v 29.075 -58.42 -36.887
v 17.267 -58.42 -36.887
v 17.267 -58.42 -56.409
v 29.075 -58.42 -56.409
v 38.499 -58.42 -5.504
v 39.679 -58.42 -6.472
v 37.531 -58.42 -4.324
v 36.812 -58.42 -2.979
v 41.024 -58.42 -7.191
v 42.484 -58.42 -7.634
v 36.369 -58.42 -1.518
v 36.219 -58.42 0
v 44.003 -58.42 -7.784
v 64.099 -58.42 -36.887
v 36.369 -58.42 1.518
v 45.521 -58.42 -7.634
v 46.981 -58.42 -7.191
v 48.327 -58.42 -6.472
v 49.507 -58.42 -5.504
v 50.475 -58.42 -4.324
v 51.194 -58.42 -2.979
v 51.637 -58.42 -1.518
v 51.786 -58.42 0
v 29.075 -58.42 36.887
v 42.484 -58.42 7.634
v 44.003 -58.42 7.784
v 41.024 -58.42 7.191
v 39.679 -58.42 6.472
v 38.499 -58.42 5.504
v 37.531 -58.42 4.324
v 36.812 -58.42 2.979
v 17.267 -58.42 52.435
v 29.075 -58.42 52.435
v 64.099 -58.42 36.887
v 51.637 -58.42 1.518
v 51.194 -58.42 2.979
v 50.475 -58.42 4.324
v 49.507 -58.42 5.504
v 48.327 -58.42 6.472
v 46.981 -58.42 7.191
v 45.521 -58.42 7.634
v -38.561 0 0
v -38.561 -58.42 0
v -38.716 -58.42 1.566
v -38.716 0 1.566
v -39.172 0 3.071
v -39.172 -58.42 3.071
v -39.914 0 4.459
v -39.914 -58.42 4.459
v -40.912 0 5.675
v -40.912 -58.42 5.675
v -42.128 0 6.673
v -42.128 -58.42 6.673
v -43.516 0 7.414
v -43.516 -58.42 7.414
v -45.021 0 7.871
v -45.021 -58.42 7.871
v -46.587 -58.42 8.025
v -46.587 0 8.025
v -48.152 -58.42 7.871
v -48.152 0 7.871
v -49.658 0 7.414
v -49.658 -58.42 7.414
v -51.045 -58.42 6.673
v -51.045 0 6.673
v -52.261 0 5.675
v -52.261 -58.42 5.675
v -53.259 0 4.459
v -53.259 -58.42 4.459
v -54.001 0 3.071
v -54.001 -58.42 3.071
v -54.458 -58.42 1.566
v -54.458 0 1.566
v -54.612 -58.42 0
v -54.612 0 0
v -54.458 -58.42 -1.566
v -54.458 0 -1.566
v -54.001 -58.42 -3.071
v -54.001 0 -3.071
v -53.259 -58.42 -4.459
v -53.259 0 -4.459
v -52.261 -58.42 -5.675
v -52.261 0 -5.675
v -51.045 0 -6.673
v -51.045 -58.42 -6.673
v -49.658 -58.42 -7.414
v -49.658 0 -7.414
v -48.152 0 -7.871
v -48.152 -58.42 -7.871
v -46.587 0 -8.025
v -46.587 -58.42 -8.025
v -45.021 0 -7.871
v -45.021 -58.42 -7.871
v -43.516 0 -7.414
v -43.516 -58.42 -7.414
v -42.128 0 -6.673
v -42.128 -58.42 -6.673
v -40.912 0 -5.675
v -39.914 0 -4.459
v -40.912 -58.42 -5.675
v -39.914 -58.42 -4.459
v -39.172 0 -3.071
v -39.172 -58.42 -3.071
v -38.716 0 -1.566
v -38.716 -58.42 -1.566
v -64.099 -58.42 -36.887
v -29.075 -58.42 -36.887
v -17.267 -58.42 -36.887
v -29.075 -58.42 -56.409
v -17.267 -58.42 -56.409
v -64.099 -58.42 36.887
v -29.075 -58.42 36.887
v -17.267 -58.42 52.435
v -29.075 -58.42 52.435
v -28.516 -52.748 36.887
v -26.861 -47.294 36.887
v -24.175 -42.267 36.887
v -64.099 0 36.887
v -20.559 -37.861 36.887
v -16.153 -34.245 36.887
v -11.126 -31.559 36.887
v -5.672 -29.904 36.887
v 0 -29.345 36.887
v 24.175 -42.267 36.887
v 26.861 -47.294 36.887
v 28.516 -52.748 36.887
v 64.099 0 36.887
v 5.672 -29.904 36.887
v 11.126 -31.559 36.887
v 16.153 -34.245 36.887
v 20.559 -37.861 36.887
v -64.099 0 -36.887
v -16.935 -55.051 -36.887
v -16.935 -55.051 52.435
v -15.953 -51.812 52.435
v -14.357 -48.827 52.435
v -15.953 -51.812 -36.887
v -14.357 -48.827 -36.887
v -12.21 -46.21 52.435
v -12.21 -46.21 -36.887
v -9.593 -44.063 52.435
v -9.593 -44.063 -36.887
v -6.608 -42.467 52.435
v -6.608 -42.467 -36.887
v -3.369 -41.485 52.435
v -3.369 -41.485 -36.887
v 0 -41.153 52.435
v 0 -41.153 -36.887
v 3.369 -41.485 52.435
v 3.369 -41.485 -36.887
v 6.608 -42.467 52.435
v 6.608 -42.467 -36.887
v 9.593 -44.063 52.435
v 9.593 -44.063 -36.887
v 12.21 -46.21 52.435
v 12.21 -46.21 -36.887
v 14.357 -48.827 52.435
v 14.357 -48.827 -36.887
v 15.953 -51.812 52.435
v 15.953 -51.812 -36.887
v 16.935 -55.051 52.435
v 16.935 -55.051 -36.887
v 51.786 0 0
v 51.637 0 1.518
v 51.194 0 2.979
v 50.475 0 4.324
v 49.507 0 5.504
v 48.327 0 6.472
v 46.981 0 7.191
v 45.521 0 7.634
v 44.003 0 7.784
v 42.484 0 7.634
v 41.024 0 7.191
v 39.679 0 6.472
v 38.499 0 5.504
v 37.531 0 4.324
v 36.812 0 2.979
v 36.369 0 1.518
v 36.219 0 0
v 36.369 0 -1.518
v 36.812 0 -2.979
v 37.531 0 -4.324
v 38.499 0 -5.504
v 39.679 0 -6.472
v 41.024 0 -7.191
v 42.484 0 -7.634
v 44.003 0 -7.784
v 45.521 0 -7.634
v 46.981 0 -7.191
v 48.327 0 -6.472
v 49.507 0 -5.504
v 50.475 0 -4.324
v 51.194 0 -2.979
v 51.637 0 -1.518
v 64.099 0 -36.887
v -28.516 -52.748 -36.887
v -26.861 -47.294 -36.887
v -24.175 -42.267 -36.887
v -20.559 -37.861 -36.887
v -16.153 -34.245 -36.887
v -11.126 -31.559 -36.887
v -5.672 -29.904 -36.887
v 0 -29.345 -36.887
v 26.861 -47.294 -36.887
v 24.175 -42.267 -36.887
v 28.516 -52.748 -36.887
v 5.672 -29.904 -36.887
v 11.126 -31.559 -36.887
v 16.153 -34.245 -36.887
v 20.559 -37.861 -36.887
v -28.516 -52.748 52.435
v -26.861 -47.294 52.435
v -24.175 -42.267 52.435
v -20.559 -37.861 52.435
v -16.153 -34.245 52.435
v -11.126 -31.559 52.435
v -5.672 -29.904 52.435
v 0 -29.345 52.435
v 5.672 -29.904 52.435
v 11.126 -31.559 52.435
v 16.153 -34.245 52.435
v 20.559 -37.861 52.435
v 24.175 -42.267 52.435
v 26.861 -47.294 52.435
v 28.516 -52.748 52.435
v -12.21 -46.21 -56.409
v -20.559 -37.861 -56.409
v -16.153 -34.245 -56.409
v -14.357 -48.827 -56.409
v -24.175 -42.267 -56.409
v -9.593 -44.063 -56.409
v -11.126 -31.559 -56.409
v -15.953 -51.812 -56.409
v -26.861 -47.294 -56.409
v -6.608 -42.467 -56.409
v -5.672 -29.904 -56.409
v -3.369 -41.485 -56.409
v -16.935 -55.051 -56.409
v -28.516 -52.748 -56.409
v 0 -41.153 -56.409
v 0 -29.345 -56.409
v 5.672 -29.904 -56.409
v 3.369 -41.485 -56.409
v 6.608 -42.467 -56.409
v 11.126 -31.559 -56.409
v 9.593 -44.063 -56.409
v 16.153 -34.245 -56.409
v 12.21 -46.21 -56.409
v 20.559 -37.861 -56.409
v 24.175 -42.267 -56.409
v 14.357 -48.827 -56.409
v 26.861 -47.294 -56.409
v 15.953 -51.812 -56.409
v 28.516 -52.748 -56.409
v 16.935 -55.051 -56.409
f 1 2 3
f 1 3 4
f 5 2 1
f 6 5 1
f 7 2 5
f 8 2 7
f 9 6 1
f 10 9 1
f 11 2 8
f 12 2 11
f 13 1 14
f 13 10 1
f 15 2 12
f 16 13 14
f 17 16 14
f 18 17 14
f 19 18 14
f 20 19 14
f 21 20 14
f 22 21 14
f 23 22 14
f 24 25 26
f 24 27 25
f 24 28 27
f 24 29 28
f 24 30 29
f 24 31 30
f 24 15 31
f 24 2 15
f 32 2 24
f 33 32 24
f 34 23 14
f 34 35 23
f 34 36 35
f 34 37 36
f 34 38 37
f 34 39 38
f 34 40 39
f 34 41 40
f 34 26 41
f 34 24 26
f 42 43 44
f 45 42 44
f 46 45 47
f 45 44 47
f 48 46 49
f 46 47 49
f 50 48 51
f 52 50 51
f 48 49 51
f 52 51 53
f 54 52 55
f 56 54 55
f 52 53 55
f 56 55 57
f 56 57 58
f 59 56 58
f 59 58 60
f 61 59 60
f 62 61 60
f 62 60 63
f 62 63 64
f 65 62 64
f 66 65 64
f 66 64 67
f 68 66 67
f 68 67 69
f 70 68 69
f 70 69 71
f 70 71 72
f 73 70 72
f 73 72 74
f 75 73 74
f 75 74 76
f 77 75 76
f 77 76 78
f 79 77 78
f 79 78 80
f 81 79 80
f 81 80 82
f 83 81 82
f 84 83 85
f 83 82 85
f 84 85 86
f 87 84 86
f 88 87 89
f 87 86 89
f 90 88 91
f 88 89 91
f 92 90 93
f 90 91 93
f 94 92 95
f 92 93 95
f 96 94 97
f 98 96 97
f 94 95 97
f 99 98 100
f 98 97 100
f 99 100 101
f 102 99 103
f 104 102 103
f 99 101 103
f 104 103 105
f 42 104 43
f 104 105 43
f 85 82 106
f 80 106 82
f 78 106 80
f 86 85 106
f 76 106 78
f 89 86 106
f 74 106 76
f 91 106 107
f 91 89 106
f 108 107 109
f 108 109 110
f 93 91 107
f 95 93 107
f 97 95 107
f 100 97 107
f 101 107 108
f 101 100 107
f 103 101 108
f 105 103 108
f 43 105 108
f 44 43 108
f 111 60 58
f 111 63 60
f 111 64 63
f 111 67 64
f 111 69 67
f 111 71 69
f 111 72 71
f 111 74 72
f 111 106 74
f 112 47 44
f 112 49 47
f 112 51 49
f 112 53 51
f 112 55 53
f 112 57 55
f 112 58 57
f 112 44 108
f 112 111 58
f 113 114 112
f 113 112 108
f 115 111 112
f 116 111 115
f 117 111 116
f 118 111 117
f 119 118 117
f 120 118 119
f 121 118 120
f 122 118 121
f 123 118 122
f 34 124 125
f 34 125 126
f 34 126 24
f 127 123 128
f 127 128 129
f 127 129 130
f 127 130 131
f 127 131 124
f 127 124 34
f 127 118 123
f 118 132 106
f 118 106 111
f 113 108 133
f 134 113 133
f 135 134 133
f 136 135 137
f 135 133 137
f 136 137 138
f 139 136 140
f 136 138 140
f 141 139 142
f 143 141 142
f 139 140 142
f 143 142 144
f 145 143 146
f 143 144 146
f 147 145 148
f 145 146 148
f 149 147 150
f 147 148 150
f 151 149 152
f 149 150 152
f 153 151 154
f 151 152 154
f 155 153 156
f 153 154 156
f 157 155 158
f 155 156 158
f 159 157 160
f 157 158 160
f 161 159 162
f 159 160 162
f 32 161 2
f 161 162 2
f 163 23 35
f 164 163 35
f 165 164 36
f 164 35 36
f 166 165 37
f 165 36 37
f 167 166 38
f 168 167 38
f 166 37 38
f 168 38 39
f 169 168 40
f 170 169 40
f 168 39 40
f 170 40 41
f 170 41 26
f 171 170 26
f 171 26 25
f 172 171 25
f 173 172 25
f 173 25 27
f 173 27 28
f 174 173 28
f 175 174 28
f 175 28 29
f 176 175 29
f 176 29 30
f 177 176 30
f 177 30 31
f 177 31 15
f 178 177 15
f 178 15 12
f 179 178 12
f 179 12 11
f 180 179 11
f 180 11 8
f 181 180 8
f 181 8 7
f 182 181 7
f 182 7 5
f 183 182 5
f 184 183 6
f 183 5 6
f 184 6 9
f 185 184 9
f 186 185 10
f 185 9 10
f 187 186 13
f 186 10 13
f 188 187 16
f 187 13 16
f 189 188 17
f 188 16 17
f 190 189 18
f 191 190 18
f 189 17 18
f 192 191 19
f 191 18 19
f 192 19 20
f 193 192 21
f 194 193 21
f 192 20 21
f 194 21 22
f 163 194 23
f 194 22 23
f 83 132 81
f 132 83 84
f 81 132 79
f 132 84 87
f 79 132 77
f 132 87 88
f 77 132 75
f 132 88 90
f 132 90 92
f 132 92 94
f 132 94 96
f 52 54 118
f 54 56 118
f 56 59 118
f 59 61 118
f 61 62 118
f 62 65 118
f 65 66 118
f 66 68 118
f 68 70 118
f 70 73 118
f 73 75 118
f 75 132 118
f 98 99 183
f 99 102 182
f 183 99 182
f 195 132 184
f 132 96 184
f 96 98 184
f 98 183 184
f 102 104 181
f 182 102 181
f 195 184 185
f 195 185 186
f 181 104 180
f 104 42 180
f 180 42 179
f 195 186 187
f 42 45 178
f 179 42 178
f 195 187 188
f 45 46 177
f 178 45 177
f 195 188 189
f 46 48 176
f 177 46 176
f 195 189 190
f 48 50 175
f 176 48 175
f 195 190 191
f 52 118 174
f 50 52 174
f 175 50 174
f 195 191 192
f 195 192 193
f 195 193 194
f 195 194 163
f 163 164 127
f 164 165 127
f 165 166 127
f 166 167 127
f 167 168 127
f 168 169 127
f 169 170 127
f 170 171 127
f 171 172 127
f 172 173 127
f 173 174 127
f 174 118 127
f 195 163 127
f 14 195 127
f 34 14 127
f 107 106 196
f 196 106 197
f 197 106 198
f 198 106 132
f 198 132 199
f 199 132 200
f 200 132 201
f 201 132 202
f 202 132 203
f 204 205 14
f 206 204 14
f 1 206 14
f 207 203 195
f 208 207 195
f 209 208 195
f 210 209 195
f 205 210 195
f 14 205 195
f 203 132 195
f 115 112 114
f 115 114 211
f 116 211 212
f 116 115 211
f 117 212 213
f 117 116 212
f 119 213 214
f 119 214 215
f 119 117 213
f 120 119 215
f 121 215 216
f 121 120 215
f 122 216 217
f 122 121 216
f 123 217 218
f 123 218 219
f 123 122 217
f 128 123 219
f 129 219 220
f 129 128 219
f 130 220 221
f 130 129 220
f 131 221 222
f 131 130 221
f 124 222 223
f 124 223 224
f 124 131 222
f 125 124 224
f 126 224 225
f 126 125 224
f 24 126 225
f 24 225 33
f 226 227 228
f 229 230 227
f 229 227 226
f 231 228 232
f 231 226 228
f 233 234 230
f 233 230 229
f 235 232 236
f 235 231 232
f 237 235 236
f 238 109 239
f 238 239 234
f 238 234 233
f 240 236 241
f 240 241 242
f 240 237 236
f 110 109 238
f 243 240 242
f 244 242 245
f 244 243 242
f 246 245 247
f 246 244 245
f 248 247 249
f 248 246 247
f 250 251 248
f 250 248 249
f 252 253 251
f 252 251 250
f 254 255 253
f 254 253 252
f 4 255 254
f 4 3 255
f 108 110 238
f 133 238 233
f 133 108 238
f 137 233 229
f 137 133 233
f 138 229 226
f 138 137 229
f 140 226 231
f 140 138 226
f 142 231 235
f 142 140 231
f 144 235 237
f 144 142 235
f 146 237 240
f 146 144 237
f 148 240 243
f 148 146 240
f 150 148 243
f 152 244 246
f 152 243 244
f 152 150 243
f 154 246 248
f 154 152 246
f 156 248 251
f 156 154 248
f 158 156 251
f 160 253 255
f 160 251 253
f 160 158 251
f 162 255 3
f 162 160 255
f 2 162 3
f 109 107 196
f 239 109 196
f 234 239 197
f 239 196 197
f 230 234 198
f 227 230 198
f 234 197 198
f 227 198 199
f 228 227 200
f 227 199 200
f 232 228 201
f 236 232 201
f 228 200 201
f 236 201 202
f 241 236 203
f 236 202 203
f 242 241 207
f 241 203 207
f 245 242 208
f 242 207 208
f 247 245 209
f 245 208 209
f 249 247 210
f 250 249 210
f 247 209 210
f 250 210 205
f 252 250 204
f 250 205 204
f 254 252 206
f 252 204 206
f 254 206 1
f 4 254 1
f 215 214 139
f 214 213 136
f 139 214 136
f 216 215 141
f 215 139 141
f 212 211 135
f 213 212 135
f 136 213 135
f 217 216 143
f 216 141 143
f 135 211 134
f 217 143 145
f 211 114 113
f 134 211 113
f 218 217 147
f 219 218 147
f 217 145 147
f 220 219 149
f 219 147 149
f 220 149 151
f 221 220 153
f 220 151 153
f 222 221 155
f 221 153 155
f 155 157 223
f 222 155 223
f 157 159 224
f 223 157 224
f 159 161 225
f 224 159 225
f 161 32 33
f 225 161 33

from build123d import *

# Parameters (mm, degrees)
F0_W          = 128.197401762
F0_H          = 73.774009943
F1_DEPTH      = 58.42
F2_DEPTH      = 19.5215027779
F2_DEPTH_BACK = 89.3221944571
F7_R          = 17.2672830395
F3_DEPTH      = 89.3231944571
F3_DEPTH_BACK = 25.4
F8_R          = 7.783506766
F4_DEPTH      = 58.421
F9_R          = 8.0252632598
F10_DEPTH     = 58.421


with BuildPart() as f1:
    # F0 (on Front) → F1 (new body)
    with BuildSketch(Plane.XZ):
        Rectangle(F0_W, F0_H)
    extrude(amount=F1_DEPTH)

    # F6 (on face) → F2 (join, two sides)
    with BuildSketch(Plane(origin=(0, 0, -36.8870049715), x_dir=(1, 0, 0), z_dir=(0, 0, -1))) as f2_sk:
        with BuildLine():
            ThreePointArc((-29.0746443466, 58.42), (0, 29.3453556534), (29.0746443466, 58.42))
            Line((29.0746443466, 58.42), (-29.0746443466, 58.42))
        make_face()
    extrude(amount=F2_DEPTH)
    extrude(f2_sk.sketch, amount=-F2_DEPTH_BACK)

    # F7 (on face) → F3 (cut, two sides)
    with BuildSketch(Plane(origin=(0, 0, -36.8870049715), x_dir=(1, 0, 0), z_dir=(0, 0, -1))) as f3_sk:
        with Locations((0, 58.42)):
            Circle(F7_R)
    extrude(amount=-F3_DEPTH, mode=Mode.SUBTRACT)
    extrude(f3_sk.sketch, amount=F3_DEPTH_BACK, mode=Mode.SUBTRACT)

    # F8 (on face) → F4 (cut, through all)
    with BuildSketch(Plane.XZ.offset(58.42)):
        with Locations((44.0028309822, 0)):
            Circle(F8_R)
    extrude(amount=-F4_DEPTH, mode=Mode.SUBTRACT)

    # F9 (on face) → F10 (cut, through all)
    with BuildSketch(Plane.XZ.offset(58.42)):
        with Locations((-46.5866726138, 0)):
            Circle(F9_R)
    extrude(amount=-F10_DEPTH, mode=Mode.SUBTRACT)


solid = f1.part
